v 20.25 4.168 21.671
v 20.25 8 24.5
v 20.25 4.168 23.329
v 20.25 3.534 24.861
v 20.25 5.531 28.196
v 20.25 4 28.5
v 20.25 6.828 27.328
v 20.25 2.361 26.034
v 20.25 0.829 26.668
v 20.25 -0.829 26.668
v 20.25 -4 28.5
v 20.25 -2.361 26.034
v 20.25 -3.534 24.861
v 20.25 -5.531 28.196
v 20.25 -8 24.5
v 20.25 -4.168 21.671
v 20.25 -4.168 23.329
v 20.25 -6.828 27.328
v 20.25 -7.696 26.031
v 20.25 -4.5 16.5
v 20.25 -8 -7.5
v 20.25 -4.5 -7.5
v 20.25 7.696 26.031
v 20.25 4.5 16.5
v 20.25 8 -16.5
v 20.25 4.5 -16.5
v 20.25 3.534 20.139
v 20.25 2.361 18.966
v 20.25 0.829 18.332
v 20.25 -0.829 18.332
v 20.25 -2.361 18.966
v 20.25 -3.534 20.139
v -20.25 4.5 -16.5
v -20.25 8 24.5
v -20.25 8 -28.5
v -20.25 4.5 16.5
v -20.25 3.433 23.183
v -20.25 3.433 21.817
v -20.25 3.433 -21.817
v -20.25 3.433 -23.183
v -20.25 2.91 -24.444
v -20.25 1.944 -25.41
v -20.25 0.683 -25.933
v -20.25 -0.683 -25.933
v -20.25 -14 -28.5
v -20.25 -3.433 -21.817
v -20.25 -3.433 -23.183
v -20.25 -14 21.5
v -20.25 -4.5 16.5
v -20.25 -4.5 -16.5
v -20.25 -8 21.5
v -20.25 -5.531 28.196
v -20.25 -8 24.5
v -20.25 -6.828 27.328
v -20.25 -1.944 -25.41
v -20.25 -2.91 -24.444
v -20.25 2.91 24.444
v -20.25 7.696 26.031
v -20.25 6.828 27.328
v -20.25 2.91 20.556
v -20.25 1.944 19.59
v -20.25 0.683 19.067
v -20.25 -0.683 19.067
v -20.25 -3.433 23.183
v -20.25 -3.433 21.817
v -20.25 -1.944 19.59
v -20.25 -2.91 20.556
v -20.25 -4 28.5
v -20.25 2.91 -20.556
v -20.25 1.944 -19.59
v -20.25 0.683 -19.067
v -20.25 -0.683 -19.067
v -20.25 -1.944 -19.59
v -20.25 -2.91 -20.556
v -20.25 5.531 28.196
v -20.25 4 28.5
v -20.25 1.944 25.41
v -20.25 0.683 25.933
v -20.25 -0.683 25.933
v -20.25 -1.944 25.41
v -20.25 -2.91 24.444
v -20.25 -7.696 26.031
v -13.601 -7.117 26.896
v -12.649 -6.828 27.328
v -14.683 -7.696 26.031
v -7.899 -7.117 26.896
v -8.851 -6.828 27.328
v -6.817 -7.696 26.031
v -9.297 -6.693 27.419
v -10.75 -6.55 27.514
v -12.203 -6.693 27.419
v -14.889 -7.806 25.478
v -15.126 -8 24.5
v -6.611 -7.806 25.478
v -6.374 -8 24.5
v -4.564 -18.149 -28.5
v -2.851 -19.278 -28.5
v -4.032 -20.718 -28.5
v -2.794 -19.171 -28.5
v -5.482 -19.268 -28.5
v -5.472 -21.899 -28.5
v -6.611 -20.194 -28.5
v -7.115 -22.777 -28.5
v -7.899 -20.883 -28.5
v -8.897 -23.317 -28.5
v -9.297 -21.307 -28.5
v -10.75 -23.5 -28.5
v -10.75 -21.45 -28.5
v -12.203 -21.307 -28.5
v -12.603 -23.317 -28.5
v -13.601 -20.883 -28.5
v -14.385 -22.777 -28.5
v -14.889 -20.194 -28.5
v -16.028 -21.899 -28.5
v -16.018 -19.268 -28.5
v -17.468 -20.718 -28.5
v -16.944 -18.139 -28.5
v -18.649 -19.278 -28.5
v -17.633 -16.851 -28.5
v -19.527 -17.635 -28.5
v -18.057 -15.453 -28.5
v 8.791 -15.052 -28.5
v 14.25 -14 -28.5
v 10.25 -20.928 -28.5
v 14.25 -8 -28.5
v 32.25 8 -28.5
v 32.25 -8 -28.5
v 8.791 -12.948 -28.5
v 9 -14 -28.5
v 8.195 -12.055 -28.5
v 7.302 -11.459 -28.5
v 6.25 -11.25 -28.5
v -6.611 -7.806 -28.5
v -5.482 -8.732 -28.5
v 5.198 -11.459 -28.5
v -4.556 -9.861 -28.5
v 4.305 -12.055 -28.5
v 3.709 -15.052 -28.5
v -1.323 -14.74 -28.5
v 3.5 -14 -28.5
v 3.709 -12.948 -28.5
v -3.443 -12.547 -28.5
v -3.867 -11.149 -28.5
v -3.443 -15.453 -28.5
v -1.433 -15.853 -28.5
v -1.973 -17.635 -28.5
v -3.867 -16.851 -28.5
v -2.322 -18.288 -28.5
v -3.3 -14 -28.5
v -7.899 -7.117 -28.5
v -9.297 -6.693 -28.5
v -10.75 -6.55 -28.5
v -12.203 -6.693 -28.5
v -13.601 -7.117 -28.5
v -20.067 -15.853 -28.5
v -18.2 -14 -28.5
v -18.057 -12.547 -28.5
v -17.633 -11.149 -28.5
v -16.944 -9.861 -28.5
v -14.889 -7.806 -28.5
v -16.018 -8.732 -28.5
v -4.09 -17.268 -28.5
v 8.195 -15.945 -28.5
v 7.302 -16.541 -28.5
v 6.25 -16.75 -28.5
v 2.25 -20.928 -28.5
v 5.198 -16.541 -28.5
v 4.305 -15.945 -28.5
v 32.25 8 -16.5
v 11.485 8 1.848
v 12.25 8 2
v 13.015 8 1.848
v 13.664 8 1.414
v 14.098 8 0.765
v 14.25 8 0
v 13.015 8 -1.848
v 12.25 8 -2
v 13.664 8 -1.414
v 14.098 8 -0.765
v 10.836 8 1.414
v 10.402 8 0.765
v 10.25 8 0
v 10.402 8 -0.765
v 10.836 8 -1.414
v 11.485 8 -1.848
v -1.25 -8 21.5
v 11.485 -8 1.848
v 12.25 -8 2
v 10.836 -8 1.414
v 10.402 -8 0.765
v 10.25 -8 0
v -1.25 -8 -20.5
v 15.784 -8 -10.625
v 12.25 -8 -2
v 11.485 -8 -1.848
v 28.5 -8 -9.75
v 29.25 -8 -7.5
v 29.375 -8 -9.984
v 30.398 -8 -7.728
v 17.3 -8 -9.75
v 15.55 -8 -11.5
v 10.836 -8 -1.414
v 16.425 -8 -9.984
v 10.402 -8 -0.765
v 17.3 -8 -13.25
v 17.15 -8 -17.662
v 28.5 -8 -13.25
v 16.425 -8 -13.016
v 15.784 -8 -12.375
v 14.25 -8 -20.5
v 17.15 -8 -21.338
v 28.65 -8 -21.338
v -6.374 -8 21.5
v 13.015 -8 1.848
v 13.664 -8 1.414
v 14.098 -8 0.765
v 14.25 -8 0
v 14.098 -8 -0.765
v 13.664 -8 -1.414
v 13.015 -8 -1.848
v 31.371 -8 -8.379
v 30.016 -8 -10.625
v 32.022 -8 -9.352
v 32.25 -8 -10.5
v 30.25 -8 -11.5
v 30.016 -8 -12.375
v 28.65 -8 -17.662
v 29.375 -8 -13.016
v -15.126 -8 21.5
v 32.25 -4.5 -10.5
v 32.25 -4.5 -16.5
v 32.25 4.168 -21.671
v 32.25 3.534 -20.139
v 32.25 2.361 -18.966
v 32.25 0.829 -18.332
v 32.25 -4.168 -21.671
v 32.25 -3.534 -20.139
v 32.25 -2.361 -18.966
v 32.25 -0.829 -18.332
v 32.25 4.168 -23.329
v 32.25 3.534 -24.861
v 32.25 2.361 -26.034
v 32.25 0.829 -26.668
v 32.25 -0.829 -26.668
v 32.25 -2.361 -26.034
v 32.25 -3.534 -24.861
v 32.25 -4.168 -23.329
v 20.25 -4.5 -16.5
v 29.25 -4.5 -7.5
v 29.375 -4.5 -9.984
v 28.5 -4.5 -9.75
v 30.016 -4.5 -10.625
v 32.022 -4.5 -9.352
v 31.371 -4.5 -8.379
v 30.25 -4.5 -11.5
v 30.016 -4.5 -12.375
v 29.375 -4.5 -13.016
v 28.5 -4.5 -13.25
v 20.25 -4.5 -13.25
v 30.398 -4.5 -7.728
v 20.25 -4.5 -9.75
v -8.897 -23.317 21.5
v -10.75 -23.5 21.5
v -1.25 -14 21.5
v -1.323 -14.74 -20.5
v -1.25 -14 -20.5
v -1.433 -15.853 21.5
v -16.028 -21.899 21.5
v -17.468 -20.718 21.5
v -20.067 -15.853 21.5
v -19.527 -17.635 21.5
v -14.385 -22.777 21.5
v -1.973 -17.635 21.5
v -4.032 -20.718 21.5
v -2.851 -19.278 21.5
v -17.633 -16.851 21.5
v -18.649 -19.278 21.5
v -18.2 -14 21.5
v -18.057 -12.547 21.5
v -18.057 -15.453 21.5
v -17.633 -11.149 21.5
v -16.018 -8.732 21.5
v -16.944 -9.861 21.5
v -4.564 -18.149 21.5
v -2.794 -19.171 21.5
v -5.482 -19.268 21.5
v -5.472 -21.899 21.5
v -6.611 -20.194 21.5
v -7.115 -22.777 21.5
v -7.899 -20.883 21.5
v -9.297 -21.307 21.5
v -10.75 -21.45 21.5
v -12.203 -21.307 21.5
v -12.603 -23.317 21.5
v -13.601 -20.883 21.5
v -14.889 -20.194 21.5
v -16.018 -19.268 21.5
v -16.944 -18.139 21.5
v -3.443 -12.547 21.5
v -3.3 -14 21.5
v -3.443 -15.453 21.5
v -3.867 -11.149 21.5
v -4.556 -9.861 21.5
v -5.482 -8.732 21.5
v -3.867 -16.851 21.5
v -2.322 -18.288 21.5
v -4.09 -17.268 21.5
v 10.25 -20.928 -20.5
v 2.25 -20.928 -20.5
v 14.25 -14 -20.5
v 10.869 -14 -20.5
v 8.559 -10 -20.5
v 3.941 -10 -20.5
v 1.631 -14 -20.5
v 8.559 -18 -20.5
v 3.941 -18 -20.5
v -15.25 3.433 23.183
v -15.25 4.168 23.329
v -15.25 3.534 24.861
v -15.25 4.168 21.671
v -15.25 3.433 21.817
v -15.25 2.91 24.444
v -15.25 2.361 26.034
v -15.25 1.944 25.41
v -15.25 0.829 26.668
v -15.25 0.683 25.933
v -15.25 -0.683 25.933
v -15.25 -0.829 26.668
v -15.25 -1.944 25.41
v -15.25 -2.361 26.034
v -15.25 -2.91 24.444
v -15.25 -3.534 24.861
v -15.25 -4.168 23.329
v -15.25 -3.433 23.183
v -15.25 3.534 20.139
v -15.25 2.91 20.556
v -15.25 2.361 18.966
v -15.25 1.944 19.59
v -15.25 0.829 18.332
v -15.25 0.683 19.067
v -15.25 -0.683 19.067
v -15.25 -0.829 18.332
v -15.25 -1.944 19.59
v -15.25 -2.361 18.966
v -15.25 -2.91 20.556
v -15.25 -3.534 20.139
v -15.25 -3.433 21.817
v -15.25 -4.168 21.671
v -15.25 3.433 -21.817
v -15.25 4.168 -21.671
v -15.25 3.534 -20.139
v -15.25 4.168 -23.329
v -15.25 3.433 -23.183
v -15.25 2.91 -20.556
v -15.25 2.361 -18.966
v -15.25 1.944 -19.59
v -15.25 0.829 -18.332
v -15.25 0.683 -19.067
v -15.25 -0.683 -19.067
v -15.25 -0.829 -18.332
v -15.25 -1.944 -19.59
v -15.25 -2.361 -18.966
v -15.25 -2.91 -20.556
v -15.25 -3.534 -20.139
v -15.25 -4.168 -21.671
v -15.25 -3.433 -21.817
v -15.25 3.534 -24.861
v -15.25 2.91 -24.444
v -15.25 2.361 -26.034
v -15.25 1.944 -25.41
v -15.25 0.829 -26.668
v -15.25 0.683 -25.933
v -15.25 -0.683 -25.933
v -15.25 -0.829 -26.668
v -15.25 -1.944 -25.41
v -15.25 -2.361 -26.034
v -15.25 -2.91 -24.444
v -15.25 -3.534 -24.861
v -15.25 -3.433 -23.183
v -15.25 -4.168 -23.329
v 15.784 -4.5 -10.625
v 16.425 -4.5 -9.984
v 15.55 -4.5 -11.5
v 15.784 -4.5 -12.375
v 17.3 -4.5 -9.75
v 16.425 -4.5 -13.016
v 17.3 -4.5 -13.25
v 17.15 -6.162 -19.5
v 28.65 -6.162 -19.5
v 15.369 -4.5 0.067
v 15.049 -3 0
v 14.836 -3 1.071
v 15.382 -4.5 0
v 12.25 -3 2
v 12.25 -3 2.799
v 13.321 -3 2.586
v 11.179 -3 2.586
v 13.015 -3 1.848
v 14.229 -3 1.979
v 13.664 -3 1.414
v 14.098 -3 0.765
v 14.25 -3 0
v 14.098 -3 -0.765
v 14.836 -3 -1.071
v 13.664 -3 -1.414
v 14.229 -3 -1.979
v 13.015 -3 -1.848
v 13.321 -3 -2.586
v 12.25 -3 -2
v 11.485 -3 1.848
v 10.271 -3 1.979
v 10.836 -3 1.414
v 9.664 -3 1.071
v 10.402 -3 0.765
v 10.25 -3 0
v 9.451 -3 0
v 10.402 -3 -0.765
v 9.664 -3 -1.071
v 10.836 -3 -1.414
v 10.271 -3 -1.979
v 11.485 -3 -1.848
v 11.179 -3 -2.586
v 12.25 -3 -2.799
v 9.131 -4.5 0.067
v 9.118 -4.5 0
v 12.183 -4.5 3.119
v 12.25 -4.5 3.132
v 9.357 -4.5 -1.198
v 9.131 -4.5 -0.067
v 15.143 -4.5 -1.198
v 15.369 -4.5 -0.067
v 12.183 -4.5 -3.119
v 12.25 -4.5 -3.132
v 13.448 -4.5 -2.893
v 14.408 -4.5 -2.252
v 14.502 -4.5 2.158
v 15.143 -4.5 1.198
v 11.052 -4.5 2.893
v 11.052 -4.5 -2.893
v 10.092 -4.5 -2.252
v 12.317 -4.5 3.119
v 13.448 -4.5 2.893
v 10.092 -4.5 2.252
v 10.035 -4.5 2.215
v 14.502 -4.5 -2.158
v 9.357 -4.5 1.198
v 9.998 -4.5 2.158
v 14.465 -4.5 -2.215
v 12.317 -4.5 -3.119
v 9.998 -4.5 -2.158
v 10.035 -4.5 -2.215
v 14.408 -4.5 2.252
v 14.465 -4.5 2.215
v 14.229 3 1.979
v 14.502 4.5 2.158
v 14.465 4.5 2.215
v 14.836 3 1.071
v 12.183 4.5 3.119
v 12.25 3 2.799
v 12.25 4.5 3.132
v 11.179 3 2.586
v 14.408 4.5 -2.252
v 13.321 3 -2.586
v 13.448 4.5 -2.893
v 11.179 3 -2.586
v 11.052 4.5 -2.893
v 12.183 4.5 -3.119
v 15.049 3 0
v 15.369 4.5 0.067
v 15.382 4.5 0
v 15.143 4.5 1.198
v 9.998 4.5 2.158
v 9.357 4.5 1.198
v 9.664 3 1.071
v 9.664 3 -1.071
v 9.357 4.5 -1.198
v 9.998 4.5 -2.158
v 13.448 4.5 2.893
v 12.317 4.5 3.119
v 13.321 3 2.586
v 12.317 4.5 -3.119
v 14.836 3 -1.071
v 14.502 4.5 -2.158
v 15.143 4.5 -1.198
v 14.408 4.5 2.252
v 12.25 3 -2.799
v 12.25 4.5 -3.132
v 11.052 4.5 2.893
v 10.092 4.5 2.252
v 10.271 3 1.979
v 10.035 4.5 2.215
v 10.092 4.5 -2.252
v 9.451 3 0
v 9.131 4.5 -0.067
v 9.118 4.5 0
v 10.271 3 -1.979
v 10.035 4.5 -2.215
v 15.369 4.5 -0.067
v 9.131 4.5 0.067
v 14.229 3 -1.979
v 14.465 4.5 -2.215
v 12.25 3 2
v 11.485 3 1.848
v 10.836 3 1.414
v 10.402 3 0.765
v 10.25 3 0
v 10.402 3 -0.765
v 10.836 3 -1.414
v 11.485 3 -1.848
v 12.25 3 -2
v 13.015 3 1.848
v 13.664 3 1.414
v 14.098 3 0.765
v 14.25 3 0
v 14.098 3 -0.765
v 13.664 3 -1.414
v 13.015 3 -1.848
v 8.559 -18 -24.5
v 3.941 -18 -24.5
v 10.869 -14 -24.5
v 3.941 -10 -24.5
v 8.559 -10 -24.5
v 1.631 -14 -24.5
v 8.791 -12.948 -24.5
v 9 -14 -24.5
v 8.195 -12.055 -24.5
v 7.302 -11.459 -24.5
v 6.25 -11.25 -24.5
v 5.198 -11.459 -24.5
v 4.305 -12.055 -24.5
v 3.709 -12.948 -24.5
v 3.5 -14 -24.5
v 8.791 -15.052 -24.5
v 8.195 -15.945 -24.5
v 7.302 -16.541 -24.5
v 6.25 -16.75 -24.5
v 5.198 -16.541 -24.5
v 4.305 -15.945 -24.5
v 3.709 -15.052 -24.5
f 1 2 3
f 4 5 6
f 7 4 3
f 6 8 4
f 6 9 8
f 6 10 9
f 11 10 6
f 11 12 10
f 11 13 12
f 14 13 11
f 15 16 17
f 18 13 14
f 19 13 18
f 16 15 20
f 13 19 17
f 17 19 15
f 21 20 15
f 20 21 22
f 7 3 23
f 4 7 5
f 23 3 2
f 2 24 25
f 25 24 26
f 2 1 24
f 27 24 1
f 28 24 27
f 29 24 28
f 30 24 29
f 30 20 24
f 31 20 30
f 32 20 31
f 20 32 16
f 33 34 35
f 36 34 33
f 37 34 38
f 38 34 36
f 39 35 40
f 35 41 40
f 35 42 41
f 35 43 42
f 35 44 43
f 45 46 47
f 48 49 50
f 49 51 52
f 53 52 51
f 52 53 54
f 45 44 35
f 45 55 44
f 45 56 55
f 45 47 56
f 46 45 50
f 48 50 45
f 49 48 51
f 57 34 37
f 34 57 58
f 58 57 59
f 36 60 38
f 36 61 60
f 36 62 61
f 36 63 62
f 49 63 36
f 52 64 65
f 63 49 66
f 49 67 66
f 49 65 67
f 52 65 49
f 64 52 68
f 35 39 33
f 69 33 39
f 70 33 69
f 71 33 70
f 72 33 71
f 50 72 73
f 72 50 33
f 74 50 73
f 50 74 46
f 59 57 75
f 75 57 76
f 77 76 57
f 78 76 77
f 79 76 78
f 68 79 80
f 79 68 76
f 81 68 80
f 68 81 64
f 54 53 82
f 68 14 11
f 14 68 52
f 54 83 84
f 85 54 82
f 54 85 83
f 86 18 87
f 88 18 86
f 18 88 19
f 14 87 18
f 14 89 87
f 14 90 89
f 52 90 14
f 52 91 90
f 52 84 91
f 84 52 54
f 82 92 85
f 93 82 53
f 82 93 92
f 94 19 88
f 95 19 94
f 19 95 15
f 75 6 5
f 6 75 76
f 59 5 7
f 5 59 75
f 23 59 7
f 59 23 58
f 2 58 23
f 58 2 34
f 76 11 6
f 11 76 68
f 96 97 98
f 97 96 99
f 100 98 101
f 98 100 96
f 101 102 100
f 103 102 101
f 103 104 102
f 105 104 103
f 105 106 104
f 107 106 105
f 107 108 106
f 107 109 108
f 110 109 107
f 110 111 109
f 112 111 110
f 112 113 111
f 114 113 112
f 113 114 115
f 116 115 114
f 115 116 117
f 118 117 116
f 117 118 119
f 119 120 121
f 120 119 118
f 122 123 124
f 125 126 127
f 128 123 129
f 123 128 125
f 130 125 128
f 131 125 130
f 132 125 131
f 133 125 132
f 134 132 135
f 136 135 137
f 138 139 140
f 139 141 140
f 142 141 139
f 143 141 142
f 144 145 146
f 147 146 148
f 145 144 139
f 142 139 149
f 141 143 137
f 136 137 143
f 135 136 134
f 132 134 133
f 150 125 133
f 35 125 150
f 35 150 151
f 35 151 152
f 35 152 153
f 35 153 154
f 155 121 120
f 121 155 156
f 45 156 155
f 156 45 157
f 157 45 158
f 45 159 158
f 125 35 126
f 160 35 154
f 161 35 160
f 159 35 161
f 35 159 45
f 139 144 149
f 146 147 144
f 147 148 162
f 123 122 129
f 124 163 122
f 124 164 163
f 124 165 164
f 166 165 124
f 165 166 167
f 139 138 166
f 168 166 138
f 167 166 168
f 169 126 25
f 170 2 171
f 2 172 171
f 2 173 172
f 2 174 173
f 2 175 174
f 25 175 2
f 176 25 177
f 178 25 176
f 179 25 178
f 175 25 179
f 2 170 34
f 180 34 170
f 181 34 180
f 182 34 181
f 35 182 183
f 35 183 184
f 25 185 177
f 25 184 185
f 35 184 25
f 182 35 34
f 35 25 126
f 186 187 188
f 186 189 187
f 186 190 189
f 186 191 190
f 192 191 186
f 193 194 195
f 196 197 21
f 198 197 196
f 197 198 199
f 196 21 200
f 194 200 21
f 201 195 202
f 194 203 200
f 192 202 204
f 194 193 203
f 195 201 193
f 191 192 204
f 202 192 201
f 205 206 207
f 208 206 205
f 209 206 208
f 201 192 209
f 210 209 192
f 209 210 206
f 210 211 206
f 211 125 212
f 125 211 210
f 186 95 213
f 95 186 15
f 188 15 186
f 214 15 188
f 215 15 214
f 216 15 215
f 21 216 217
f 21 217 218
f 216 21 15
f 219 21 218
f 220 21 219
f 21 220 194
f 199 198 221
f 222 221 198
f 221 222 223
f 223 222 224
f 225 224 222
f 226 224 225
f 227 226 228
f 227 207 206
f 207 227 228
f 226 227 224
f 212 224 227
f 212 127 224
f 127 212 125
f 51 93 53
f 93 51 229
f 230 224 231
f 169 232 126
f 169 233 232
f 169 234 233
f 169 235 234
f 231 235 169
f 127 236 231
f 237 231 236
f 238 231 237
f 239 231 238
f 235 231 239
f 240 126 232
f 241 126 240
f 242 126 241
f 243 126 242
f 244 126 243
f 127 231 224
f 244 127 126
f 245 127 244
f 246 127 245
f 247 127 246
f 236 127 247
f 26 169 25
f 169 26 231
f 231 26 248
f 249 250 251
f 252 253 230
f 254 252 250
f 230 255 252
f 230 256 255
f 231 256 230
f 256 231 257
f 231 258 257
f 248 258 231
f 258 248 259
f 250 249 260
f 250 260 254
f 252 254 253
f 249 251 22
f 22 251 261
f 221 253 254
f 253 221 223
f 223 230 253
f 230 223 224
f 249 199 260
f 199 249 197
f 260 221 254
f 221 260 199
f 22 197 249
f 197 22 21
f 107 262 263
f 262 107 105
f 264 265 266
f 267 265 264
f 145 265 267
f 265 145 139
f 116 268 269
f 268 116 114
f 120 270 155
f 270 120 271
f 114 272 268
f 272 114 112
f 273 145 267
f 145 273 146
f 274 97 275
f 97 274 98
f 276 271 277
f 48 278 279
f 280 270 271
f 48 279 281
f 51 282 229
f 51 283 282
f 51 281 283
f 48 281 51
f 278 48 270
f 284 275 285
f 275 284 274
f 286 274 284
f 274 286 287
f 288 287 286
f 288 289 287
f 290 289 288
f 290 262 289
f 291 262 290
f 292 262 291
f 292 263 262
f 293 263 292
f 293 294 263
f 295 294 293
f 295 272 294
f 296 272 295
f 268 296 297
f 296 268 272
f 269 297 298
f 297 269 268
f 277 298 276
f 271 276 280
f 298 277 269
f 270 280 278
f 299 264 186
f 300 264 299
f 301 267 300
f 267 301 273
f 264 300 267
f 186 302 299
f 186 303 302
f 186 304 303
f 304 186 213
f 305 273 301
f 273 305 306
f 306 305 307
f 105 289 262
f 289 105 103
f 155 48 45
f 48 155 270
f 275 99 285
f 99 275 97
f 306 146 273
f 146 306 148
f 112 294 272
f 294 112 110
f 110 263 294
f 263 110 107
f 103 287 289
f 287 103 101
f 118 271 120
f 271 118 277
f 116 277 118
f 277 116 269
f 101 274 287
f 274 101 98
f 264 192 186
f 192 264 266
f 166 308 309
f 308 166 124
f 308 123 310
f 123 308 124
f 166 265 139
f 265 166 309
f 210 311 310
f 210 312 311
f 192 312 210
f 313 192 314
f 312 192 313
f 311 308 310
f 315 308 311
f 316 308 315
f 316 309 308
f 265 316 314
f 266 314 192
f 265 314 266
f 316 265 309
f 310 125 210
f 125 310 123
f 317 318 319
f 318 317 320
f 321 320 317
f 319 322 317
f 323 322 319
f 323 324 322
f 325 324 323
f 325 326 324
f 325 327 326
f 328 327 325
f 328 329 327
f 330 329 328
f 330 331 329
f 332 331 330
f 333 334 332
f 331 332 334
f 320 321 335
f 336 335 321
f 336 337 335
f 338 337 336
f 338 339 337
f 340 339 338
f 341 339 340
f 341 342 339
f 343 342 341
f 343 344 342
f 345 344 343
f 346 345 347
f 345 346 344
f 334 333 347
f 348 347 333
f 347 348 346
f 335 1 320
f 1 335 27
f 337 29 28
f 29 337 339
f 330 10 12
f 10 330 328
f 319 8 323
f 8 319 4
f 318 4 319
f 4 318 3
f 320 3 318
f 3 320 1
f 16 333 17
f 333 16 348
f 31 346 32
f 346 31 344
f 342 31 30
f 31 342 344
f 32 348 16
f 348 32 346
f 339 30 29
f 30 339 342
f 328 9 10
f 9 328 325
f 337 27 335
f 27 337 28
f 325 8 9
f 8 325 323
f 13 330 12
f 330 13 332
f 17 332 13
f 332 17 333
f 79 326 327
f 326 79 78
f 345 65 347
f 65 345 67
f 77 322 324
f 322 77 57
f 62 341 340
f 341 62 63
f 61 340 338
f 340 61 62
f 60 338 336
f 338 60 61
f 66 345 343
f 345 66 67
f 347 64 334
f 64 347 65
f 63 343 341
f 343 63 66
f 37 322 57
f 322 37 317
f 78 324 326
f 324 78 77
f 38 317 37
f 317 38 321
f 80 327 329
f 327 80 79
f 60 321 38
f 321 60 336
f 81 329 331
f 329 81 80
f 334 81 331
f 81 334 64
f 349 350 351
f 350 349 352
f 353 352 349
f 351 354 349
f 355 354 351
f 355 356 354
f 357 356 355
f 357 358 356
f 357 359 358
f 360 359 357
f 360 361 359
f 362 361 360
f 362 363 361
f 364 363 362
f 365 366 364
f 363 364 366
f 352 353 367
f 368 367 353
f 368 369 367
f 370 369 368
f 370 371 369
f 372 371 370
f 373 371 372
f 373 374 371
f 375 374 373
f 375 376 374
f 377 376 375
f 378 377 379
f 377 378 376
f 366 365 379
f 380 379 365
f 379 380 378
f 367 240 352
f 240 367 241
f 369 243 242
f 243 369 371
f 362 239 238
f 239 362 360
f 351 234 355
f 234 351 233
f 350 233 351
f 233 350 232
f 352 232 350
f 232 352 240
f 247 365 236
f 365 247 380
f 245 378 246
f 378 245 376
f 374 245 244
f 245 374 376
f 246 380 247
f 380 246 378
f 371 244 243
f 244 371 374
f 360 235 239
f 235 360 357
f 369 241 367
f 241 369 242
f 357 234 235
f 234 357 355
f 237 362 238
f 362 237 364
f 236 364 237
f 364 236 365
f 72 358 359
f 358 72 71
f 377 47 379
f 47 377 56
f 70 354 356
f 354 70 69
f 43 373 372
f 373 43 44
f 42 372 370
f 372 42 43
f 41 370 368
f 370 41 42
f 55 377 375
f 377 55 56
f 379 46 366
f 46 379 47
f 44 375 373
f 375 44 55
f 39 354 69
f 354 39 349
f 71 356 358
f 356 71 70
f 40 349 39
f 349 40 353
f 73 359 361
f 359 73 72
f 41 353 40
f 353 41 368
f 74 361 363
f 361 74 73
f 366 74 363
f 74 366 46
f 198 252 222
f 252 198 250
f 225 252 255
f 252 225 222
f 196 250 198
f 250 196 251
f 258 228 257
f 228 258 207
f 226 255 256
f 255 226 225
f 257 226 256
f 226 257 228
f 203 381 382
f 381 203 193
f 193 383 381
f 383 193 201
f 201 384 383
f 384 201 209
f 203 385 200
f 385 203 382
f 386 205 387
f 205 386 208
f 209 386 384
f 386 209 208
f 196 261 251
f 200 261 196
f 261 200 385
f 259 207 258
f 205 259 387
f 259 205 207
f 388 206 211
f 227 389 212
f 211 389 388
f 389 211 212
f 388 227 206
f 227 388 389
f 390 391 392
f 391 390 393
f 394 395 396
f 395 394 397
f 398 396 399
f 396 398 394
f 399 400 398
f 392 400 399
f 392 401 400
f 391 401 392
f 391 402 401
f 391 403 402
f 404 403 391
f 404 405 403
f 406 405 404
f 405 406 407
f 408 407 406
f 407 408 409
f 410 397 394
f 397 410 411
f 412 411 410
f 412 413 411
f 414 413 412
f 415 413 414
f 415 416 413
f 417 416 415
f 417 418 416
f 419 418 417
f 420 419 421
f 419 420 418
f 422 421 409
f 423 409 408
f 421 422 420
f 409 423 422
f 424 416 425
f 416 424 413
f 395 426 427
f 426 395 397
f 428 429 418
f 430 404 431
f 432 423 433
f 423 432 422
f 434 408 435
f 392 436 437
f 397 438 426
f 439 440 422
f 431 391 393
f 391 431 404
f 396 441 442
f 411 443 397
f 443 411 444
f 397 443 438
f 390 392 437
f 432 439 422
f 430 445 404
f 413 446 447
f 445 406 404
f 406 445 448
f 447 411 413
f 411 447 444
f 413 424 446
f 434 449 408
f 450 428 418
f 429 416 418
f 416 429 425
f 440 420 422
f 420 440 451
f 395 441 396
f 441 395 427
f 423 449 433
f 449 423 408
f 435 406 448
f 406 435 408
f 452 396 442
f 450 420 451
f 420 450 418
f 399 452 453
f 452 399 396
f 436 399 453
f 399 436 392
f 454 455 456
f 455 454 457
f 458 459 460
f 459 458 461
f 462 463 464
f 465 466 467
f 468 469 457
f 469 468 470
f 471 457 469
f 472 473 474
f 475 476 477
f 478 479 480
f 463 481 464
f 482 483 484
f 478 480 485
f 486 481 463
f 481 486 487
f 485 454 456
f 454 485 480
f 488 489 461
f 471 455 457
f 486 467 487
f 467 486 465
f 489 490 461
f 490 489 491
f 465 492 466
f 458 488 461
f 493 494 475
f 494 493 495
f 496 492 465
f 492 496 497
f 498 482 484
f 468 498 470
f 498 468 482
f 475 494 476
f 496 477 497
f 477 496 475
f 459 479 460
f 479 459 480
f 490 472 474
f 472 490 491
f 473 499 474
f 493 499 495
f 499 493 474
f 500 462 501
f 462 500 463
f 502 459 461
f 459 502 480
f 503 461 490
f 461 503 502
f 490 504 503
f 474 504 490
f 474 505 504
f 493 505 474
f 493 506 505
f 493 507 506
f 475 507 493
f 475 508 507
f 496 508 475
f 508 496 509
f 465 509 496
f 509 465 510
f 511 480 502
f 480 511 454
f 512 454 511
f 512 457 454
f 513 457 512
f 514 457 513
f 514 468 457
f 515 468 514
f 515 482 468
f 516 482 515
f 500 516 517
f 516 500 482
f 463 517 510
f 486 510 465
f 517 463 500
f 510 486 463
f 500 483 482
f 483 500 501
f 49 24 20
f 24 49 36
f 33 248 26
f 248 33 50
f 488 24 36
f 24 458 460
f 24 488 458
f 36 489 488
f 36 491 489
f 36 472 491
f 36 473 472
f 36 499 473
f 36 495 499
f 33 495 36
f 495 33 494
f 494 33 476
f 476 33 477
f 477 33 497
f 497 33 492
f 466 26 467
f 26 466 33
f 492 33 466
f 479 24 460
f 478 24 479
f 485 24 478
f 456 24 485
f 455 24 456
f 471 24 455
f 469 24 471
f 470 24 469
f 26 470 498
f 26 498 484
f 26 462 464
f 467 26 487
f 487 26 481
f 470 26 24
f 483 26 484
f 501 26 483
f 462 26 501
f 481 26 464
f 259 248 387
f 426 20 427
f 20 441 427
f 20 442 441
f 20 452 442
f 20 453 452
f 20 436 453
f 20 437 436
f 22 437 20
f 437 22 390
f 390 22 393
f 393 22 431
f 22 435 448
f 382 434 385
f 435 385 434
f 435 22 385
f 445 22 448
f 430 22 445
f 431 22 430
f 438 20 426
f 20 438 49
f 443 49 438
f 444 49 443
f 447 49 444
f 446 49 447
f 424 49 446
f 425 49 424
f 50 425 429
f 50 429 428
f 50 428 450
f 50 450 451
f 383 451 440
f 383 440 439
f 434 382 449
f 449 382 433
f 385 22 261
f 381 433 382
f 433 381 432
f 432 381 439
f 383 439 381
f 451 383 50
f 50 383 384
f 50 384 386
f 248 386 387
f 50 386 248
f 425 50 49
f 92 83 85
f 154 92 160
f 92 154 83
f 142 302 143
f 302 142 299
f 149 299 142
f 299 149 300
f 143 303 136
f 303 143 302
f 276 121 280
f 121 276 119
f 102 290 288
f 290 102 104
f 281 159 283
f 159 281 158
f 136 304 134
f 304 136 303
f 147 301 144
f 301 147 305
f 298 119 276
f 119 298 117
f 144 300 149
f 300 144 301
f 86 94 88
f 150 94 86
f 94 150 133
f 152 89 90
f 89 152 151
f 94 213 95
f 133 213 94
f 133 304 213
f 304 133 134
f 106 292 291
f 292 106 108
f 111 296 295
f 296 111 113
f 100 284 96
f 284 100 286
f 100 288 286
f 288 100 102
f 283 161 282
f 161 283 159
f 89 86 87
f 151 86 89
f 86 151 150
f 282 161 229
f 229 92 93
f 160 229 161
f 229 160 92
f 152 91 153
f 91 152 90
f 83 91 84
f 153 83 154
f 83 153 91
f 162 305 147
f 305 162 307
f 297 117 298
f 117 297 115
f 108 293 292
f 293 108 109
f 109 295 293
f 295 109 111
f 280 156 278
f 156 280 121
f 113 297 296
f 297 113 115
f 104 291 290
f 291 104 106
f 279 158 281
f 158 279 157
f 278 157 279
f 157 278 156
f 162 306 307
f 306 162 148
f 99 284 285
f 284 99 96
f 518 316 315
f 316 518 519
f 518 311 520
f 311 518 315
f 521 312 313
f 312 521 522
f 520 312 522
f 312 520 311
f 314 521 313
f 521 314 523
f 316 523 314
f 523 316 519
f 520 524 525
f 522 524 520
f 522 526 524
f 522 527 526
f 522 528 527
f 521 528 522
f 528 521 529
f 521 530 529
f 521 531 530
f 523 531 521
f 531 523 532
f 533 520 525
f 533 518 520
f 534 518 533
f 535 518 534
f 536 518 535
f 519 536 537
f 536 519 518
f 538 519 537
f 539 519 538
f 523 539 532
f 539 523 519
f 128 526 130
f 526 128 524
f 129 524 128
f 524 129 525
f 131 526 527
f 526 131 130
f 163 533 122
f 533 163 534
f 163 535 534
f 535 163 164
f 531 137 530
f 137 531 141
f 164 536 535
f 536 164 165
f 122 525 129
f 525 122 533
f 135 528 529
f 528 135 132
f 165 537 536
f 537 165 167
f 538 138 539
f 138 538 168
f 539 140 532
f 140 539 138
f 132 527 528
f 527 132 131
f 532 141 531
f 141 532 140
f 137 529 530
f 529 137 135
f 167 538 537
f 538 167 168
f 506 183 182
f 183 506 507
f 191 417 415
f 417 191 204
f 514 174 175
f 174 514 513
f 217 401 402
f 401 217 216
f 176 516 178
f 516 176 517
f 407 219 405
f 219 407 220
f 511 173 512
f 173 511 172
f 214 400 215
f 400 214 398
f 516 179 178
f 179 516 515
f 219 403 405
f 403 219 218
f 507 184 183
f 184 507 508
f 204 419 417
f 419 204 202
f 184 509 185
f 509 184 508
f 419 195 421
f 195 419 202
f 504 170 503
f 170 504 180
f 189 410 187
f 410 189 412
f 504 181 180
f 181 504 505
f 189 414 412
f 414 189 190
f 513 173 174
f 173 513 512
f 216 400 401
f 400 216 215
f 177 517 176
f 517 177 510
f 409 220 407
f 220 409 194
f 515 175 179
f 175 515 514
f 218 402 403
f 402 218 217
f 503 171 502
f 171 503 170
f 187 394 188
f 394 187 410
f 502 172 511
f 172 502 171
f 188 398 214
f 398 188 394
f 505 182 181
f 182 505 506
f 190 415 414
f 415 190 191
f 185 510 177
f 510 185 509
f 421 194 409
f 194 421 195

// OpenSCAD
         ///////////////////////////////////////////////////////////////////////
        // MODIFIED SCAD MODEL BASED ON THE PRUSA I3 EINSTEIN REWORK         //
       // LICENSED UNDER: GPL V2                                            //
      // ORIGINALLY CREATED BY EMOTION-TECH (http://www.reprap-france.com) //
     // MODIFIED BY MORITZ WALTER (iamnotachoice.com)                     //
    // ORIGINAL PART: X-END-IDLER.STL                                    //
   // MODIFIED PART: X-END-IDLER-RE.SCAD                                //
  // DATE OF CREATION/MODIFICATION: 14.09.2014                         //
 // VERSION 0.1                                                       //
////                                                               ////
// DESCRIPTION:                                                      //
// - parametrized the whole part                                     //
// - removed windows for more rigidity                               //
// - moved screw hole and flange for more rigidity and printability  //
// - minor changes where original parameters were missing            //
///////////////////////////////////////////////////////////////////////

  ///////////////////
 // CONFIGURATION //
///////////////////

// SMOOTH RODS
smooth_rod_diameter=8.5; // drill diameter of smooth rods
smooth_rod_fn=16;	// polygon resolution of smooth rods and taps
interaxial_distance=45; // interaxial distance between smooth rods
tap_diameter=7; // drill diameter of the counter screw tap, defaults to 7 which is good for a M8 screw
tap_length=5; // length of the counter screw tap, 5 is good for M8, don't make this too long or you have to shorten your smooth rods

// GENERAL DIMENSIONS
main_length=40.5; // length of the main body block (excluding foot)
main_width=16; // width of above block
total_height=57; // total height of the idler
total_length=52.5; // total length of the idler (including foot)
core_height=33; // height of the core cutout
walls_width=3.5; // width of the walls arround the core cutout
foot_height=12; // height of the foot
top_corner_radius=4.0; // rounded corner radius of the main body block
top_corner_fn=16; // polygon resolution of the above rounded corners

// MOUNT FOR ENDSTOP DIMENSIONS
mount_slot_height=3.5; // height of the slot/cutout
mount_slot_z=17; // z-offset of the mount slot relative to the top of the idler (= bottom of the model)
mount_slot_border=2; // border in x direction of the mount slot
mount_slot_width=14.7; // width of the mounting slot
mount_slot_fn=12; // polygon resolution of the slots rounded corners
mount_pin_cutout=2.6; // length of the sides for the tiny cutout for the through hole component pins of the endstop
mount_pin_cutout_width=11.5; // width of the above cutout
mount_pin_cutout_z=9; // z-offset of above cutout relative to the top of the idler (= bottom of the model)
mount_total_height=21; // total height of the mount, relative to the top of the idler (= bottom of the model)
mount_corner_radius=3; // rounded-corner radius of the mount
mount_corner_fn=16; // polygon resolution of above rounded corners

// BEARING MOUNT FLANGES
flange_holes_x=12.25; // x position of the flange holes
flange_holes_diameter=4; // drill diameter of the flange holes, defaults to 4 which is good for M4
flange_fn=16; // polygon resolution of flanges and above drill holes
flange_width=1.5; // width of the flanges that hold the bearing in place
flange_inner_diameter=5.5986; // inner (=smaller) diameter of the flanges
flange_outer_diameter=6.308; // outer (=larger) diameter of the flanges
flange_overlap=0.1; // overlap helper for correct rendering

// BUSHING BRACKET
bushing_diameter=14.9;
bushing_bracket_walls=2.05;
bushing_bracket_diameter=bushing_diameter+2*bushing_bracket_walls;
bushing_interaxial=14;
bushing_bracket_height=50;
bushing_fn=32;
bushing_bracket_slot_width=1;
bushing_bracket_slot_angle=-30;

// LEAD NUT BRACKET
lead_nut_size=9.2376;
lead_nut_fn=6;
lead_nut_height=4;//3.1;
lead_nut_smooth_rod_distance=17;
lead_nut_interaxial=14;
lead_nut_bracket_height=8;
lead_nut_bracket_diameter=16;
threaded_rod_diameter=5.5;
threaded_rod_fn=16;

  ///////////
 // MAGIC //
///////////

module vanilla_idler(){
	import("X-END-IDLER.stl");
}

module rotated_cylinder(_radius,_height,_fn,_orientation,_rotation){
	intersection(){
		if(_rotation==[90,0,0]){
			cube([4*_radius,_height,4*_radius],center=true);
		}else if(_rotation==[0,90,0]){
			cube([_height,4*_radius,4*_radius],center=true);
		}else if(_rotation==[0,0,90]){
			cube([4*_radius,4*_radius,_height],center=true);
		}
		rotate(_rotation)
			rotate([0,0,_orientation])
				cylinder(r=_radius,h=2*_height,$fn=_fn,center=true);
	}
}

module drills(){
	union(){
		// UPPER SMOOTH ROD
		translate([tap_length,0,interaxial_distance/2])
			rotated_cylinder(_radius=smooth_rod_diameter/2,_height=main_length,_fn=smooth_rod_fn,_orientation=180/smooth_rod_fn,_rotation=[0,90,0]);
		// UPPER TAP
		translate([-main_length/2,0,interaxial_distance/2])
			rotated_cylinder(_radius=tap_diameter/2,_height=2*tap_length,_fn=smooth_rod_fn,_orientation=180/smooth_rod_fn,_rotation=[0,90,0]);
		// LOWER SMOOTH ROD
		translate([tap_length+(total_length-main_length)/2,0,-interaxial_distance/2])
			rotated_cylinder(_radius=smooth_rod_diameter/2,_height=total_length,_fn=smooth_rod_fn,_orientation=180/smooth_rod_fn,_rotation=[0,90,0]);
		// LOWER TAP
		translate([-main_length/2,0,-interaxial_distance/2])
			rotated_cylinder(_radius=tap_diameter/2,_height=2*tap_length,_fn=smooth_rod_fn,_orientation=180/smooth_rod_fn,_rotation=[0,90,0]);
	}
}

module block(){
	union(){
		// RIGHT CORNER
		translate([0,-main_width/2+top_corner_radius,total_height/2-top_corner_radius])
			rotated_cylinder(_radius=top_corner_radius,_height=main_length,_center=true,_fn=top_corner_fn,_orientation=0,_rotation=[0,90,0]);
		// LEFT CORNER
		translate([0,main_width/2-top_corner_radius,total_height/2-top_corner_radius])
			rotated_cylinder(_radius=top_corner_radius,_height=main_length,_center=true,_fn=top_corner_fn,_orientation=0,_rotation=[0,90,0]);
		// CORNER BRIDGE
		translate([0,0,total_height/2-top_corner_radius])
			cube([main_length,main_width-2*top_corner_radius,2*top_corner_radius],center=true);
		// MAIN BLOCK
		translate([0,0,-top_corner_radius/2])
			cube([main_length,main_width,total_height-top_corner_radius],center=true);
		// FOOT
		translate([(total_length-main_length)/2,0,-total_height/2+foot_height/2])
			cube([total_length,main_width,foot_height],center=true);
	}
}

module block_cutout(){
	// CORE BLOCK
	cube([main_length,main_width-2*walls_width,core_height],center=true);
}

module mount_slot(){
	union(){
		// RIGHT SLOT END
		translate([(total_length-main_length)/2+total_length/2-mount_slot_border-mount_slot_height/2,-main_width/2+walls_width/2,-total_height/2+mount_slot_z])
			rotated_cylinder(_radius=mount_slot_height/2,_height=2*walls_width,_fn=mount_slot_fn,_orientation=0,_rotation=[90,0,0]);
		// LEFT SLOT END
		translate([(total_length-main_length)/2+total_length/2-mount_slot_border-mount_slot_width+mount_slot_height/2,-main_width/2+walls_width/2,-total_height/2+mount_slot_z])
			rotated_cylinder(_radius=mount_slot_height/2,_height=2*walls_width,_fn=mount_slot_fn,_orientation=0,_rotation=[90,0,0]);
		// SLOT CENTER
		translate([(total_length-main_length)/2+total_length/2-mount_slot_border-mount_slot_width/2,-main_width/2+walls_width/2,-total_height/2+mount_slot_z])
			cube([mount_slot_width-mount_slot_height,2*walls_width,mount_slot_height],center=true);
		// PIN CUTOUT
		translate([(total_length-main_length)/2+total_length/2-mount_slot_border-mount_slot_width/2,-main_width/2,-total_height/2+mount_pin_cutout_z])
			rotate([45,0,0])
				cube([mount_pin_cutout_width,mount_pin_cutout,mount_pin_cutout],center=true);
	}
}

module mount(){
	union(){
		// INNER
		translate([(total_length-main_length)/2+total_length/2-mount_slot_width/2-mount_slot_border-mount_corner_radius/2,-main_width/2+walls_width/2,-total_height/2+mount_total_height/2])
			cube([mount_slot_width+2*mount_slot_border-mount_corner_radius,walls_width,mount_total_height],center=true);
		// OUTER
		translate([(total_length-main_length)/2+total_length/2-mount_slot_width/2-mount_slot_border,-main_width/2+walls_width/2,-total_height/2+mount_total_height/2-mount_corner_radius/2])
			cube([mount_slot_width+2*mount_slot_border,walls_width,mount_total_height-mount_corner_radius],center=true);
		// CORNER
		translate([(total_length-main_length)/2+total_length/2-mount_corner_radius,-main_width/2+walls_width/2,-total_height/2+mount_total_height-mount_corner_radius])
			rotated_cylinder(_radius=mount_corner_radius,_height=walls_width,_fn=mount_corner_fn,_orientation=0,_rotation=[90,0,0]);
	}
}

module flanges(){
	translate([flange_holes_x,-main_width/2+walls_width+flange_width/2-flange_overlap/2,0])
		rotate([90,0,0])
			cylinder(r1=flange_inner_diameter/2,r2=flange_outer_diameter/2,h=flange_width+flange_overlap,center=true,$fn=flange_fn);
	translate([flange_holes_x,main_width/2-walls_width-flange_width/2+flange_overlap/2,0])
		rotate([90,0,0])
			cylinder(r1=flange_outer_diameter/2,r2=flange_inner_diameter/2,h=flange_width+flange_overlap,center=true,$fn=flange_fn);
}

module holes(){
	translate([flange_holes_x,0,0])
		rotate([90,0,0])
			cylinder(r=flange_holes_diameter/2,h=2*main_width,center=true,$fn=flange_fn);
}

module bushing_bracket(){
	union(){
		// BUSHING BRACKET
		translate([-main_length/2+bushing_bracket_diameter/2,-bushing_interaxial,-total_height/2+bushing_bracket_height/2])
			cylinder(r=bushing_bracket_diameter/2,h=bushing_bracket_height,center=true,$fn=bushing_fn,center=true);
		// BRACKET CONNECTOR
		translate([-main_length/2+bushing_bracket_diameter/2,-bushing_interaxial/2,-total_height/2+bushing_bracket_height/2])
			cube([bushing_bracket_diameter,bushing_interaxial,bushing_bracket_height],center=true);
	}
}

module bushing_cutouts(){
	// BUSHING DRILL
	translate([-main_length/2+bushing_bracket_diameter/2,-bushing_interaxial,0])
		cylinder(r=bushing_diameter/2,h=total_height,center=true,$fn=bushing_fn,center=true);
	// BUSHING BRACKET SLOT
	translate([-main_length/2+bushing_bracket_diameter/2,-bushing_interaxial,-total_height/2+bushing_bracket_height/2])
		rotate([0,0,bushing_bracket_slot_angle])
			translate([bushing_bracket_diameter/2,0,0])
				cube([bushing_bracket_diameter,bushing_bracket_slot_width,bushing_bracket_height],center=true);

}

module lead_nut_bracket(){
	union(){
		// LEAD NUT BRACKET
		translate([-main_length/2+bushing_bracket_diameter/2+lead_nut_smooth_rod_distance,-lead_nut_interaxial,-total_height/2+lead_nut_bracket_height/2])
			cylinder(r=lead_nut_bracket_diameter/2,h=lead_nut_bracket_height,center=true,$fn=lead_nut_fn,center=true);
		// BRACKET CONNECTOR
		translate([-main_length/2+bushing_bracket_diameter/2+lead_nut_smooth_rod_distance,-lead_nut_interaxial/2,-total_height/2+lead_nut_bracket_height/2])
			cube([lead_nut_bracket_diameter,lead_nut_interaxial,lead_nut_bracket_height],center=true);
	}
}
module lead_nut_bracket_cutouts(){
	union(){
		// LEAD NUT
		translate([-main_length/2+bushing_bracket_diameter/2+lead_nut_smooth_rod_distance,-lead_nut_interaxial,-total_height/2+lead_nut_bracket_height])
			cylinder(r=lead_nut_size/2,h=2*lead_nut_height,center=true,$fn=lead_nut_fn,center=true);
		// THREADED_ROD
		translate([-main_length/2+bushing_bracket_diameter/2+lead_nut_smooth_rod_distance,-lead_nut_interaxial,-total_height/2+lead_nut_bracket_height/2])
			cylinder(r=threaded_rod_diameter/2,h=2*lead_nut_bracket_height,center=true,$fn=threaded_rod_fn,center=true);
	}
}


module idler(){
	difference(){
		union(){
			block();
			mount();
			bushing_bracket();
			lead_nut_bracket();
		}
		drills();
		mount_slot();
		holes();
		difference(){
			block_cutout();
			flanges();
		}
		bushing_cutouts();
		lead_nut_bracket_cutouts();
	}
}

idler();
//vanilla_idler();
